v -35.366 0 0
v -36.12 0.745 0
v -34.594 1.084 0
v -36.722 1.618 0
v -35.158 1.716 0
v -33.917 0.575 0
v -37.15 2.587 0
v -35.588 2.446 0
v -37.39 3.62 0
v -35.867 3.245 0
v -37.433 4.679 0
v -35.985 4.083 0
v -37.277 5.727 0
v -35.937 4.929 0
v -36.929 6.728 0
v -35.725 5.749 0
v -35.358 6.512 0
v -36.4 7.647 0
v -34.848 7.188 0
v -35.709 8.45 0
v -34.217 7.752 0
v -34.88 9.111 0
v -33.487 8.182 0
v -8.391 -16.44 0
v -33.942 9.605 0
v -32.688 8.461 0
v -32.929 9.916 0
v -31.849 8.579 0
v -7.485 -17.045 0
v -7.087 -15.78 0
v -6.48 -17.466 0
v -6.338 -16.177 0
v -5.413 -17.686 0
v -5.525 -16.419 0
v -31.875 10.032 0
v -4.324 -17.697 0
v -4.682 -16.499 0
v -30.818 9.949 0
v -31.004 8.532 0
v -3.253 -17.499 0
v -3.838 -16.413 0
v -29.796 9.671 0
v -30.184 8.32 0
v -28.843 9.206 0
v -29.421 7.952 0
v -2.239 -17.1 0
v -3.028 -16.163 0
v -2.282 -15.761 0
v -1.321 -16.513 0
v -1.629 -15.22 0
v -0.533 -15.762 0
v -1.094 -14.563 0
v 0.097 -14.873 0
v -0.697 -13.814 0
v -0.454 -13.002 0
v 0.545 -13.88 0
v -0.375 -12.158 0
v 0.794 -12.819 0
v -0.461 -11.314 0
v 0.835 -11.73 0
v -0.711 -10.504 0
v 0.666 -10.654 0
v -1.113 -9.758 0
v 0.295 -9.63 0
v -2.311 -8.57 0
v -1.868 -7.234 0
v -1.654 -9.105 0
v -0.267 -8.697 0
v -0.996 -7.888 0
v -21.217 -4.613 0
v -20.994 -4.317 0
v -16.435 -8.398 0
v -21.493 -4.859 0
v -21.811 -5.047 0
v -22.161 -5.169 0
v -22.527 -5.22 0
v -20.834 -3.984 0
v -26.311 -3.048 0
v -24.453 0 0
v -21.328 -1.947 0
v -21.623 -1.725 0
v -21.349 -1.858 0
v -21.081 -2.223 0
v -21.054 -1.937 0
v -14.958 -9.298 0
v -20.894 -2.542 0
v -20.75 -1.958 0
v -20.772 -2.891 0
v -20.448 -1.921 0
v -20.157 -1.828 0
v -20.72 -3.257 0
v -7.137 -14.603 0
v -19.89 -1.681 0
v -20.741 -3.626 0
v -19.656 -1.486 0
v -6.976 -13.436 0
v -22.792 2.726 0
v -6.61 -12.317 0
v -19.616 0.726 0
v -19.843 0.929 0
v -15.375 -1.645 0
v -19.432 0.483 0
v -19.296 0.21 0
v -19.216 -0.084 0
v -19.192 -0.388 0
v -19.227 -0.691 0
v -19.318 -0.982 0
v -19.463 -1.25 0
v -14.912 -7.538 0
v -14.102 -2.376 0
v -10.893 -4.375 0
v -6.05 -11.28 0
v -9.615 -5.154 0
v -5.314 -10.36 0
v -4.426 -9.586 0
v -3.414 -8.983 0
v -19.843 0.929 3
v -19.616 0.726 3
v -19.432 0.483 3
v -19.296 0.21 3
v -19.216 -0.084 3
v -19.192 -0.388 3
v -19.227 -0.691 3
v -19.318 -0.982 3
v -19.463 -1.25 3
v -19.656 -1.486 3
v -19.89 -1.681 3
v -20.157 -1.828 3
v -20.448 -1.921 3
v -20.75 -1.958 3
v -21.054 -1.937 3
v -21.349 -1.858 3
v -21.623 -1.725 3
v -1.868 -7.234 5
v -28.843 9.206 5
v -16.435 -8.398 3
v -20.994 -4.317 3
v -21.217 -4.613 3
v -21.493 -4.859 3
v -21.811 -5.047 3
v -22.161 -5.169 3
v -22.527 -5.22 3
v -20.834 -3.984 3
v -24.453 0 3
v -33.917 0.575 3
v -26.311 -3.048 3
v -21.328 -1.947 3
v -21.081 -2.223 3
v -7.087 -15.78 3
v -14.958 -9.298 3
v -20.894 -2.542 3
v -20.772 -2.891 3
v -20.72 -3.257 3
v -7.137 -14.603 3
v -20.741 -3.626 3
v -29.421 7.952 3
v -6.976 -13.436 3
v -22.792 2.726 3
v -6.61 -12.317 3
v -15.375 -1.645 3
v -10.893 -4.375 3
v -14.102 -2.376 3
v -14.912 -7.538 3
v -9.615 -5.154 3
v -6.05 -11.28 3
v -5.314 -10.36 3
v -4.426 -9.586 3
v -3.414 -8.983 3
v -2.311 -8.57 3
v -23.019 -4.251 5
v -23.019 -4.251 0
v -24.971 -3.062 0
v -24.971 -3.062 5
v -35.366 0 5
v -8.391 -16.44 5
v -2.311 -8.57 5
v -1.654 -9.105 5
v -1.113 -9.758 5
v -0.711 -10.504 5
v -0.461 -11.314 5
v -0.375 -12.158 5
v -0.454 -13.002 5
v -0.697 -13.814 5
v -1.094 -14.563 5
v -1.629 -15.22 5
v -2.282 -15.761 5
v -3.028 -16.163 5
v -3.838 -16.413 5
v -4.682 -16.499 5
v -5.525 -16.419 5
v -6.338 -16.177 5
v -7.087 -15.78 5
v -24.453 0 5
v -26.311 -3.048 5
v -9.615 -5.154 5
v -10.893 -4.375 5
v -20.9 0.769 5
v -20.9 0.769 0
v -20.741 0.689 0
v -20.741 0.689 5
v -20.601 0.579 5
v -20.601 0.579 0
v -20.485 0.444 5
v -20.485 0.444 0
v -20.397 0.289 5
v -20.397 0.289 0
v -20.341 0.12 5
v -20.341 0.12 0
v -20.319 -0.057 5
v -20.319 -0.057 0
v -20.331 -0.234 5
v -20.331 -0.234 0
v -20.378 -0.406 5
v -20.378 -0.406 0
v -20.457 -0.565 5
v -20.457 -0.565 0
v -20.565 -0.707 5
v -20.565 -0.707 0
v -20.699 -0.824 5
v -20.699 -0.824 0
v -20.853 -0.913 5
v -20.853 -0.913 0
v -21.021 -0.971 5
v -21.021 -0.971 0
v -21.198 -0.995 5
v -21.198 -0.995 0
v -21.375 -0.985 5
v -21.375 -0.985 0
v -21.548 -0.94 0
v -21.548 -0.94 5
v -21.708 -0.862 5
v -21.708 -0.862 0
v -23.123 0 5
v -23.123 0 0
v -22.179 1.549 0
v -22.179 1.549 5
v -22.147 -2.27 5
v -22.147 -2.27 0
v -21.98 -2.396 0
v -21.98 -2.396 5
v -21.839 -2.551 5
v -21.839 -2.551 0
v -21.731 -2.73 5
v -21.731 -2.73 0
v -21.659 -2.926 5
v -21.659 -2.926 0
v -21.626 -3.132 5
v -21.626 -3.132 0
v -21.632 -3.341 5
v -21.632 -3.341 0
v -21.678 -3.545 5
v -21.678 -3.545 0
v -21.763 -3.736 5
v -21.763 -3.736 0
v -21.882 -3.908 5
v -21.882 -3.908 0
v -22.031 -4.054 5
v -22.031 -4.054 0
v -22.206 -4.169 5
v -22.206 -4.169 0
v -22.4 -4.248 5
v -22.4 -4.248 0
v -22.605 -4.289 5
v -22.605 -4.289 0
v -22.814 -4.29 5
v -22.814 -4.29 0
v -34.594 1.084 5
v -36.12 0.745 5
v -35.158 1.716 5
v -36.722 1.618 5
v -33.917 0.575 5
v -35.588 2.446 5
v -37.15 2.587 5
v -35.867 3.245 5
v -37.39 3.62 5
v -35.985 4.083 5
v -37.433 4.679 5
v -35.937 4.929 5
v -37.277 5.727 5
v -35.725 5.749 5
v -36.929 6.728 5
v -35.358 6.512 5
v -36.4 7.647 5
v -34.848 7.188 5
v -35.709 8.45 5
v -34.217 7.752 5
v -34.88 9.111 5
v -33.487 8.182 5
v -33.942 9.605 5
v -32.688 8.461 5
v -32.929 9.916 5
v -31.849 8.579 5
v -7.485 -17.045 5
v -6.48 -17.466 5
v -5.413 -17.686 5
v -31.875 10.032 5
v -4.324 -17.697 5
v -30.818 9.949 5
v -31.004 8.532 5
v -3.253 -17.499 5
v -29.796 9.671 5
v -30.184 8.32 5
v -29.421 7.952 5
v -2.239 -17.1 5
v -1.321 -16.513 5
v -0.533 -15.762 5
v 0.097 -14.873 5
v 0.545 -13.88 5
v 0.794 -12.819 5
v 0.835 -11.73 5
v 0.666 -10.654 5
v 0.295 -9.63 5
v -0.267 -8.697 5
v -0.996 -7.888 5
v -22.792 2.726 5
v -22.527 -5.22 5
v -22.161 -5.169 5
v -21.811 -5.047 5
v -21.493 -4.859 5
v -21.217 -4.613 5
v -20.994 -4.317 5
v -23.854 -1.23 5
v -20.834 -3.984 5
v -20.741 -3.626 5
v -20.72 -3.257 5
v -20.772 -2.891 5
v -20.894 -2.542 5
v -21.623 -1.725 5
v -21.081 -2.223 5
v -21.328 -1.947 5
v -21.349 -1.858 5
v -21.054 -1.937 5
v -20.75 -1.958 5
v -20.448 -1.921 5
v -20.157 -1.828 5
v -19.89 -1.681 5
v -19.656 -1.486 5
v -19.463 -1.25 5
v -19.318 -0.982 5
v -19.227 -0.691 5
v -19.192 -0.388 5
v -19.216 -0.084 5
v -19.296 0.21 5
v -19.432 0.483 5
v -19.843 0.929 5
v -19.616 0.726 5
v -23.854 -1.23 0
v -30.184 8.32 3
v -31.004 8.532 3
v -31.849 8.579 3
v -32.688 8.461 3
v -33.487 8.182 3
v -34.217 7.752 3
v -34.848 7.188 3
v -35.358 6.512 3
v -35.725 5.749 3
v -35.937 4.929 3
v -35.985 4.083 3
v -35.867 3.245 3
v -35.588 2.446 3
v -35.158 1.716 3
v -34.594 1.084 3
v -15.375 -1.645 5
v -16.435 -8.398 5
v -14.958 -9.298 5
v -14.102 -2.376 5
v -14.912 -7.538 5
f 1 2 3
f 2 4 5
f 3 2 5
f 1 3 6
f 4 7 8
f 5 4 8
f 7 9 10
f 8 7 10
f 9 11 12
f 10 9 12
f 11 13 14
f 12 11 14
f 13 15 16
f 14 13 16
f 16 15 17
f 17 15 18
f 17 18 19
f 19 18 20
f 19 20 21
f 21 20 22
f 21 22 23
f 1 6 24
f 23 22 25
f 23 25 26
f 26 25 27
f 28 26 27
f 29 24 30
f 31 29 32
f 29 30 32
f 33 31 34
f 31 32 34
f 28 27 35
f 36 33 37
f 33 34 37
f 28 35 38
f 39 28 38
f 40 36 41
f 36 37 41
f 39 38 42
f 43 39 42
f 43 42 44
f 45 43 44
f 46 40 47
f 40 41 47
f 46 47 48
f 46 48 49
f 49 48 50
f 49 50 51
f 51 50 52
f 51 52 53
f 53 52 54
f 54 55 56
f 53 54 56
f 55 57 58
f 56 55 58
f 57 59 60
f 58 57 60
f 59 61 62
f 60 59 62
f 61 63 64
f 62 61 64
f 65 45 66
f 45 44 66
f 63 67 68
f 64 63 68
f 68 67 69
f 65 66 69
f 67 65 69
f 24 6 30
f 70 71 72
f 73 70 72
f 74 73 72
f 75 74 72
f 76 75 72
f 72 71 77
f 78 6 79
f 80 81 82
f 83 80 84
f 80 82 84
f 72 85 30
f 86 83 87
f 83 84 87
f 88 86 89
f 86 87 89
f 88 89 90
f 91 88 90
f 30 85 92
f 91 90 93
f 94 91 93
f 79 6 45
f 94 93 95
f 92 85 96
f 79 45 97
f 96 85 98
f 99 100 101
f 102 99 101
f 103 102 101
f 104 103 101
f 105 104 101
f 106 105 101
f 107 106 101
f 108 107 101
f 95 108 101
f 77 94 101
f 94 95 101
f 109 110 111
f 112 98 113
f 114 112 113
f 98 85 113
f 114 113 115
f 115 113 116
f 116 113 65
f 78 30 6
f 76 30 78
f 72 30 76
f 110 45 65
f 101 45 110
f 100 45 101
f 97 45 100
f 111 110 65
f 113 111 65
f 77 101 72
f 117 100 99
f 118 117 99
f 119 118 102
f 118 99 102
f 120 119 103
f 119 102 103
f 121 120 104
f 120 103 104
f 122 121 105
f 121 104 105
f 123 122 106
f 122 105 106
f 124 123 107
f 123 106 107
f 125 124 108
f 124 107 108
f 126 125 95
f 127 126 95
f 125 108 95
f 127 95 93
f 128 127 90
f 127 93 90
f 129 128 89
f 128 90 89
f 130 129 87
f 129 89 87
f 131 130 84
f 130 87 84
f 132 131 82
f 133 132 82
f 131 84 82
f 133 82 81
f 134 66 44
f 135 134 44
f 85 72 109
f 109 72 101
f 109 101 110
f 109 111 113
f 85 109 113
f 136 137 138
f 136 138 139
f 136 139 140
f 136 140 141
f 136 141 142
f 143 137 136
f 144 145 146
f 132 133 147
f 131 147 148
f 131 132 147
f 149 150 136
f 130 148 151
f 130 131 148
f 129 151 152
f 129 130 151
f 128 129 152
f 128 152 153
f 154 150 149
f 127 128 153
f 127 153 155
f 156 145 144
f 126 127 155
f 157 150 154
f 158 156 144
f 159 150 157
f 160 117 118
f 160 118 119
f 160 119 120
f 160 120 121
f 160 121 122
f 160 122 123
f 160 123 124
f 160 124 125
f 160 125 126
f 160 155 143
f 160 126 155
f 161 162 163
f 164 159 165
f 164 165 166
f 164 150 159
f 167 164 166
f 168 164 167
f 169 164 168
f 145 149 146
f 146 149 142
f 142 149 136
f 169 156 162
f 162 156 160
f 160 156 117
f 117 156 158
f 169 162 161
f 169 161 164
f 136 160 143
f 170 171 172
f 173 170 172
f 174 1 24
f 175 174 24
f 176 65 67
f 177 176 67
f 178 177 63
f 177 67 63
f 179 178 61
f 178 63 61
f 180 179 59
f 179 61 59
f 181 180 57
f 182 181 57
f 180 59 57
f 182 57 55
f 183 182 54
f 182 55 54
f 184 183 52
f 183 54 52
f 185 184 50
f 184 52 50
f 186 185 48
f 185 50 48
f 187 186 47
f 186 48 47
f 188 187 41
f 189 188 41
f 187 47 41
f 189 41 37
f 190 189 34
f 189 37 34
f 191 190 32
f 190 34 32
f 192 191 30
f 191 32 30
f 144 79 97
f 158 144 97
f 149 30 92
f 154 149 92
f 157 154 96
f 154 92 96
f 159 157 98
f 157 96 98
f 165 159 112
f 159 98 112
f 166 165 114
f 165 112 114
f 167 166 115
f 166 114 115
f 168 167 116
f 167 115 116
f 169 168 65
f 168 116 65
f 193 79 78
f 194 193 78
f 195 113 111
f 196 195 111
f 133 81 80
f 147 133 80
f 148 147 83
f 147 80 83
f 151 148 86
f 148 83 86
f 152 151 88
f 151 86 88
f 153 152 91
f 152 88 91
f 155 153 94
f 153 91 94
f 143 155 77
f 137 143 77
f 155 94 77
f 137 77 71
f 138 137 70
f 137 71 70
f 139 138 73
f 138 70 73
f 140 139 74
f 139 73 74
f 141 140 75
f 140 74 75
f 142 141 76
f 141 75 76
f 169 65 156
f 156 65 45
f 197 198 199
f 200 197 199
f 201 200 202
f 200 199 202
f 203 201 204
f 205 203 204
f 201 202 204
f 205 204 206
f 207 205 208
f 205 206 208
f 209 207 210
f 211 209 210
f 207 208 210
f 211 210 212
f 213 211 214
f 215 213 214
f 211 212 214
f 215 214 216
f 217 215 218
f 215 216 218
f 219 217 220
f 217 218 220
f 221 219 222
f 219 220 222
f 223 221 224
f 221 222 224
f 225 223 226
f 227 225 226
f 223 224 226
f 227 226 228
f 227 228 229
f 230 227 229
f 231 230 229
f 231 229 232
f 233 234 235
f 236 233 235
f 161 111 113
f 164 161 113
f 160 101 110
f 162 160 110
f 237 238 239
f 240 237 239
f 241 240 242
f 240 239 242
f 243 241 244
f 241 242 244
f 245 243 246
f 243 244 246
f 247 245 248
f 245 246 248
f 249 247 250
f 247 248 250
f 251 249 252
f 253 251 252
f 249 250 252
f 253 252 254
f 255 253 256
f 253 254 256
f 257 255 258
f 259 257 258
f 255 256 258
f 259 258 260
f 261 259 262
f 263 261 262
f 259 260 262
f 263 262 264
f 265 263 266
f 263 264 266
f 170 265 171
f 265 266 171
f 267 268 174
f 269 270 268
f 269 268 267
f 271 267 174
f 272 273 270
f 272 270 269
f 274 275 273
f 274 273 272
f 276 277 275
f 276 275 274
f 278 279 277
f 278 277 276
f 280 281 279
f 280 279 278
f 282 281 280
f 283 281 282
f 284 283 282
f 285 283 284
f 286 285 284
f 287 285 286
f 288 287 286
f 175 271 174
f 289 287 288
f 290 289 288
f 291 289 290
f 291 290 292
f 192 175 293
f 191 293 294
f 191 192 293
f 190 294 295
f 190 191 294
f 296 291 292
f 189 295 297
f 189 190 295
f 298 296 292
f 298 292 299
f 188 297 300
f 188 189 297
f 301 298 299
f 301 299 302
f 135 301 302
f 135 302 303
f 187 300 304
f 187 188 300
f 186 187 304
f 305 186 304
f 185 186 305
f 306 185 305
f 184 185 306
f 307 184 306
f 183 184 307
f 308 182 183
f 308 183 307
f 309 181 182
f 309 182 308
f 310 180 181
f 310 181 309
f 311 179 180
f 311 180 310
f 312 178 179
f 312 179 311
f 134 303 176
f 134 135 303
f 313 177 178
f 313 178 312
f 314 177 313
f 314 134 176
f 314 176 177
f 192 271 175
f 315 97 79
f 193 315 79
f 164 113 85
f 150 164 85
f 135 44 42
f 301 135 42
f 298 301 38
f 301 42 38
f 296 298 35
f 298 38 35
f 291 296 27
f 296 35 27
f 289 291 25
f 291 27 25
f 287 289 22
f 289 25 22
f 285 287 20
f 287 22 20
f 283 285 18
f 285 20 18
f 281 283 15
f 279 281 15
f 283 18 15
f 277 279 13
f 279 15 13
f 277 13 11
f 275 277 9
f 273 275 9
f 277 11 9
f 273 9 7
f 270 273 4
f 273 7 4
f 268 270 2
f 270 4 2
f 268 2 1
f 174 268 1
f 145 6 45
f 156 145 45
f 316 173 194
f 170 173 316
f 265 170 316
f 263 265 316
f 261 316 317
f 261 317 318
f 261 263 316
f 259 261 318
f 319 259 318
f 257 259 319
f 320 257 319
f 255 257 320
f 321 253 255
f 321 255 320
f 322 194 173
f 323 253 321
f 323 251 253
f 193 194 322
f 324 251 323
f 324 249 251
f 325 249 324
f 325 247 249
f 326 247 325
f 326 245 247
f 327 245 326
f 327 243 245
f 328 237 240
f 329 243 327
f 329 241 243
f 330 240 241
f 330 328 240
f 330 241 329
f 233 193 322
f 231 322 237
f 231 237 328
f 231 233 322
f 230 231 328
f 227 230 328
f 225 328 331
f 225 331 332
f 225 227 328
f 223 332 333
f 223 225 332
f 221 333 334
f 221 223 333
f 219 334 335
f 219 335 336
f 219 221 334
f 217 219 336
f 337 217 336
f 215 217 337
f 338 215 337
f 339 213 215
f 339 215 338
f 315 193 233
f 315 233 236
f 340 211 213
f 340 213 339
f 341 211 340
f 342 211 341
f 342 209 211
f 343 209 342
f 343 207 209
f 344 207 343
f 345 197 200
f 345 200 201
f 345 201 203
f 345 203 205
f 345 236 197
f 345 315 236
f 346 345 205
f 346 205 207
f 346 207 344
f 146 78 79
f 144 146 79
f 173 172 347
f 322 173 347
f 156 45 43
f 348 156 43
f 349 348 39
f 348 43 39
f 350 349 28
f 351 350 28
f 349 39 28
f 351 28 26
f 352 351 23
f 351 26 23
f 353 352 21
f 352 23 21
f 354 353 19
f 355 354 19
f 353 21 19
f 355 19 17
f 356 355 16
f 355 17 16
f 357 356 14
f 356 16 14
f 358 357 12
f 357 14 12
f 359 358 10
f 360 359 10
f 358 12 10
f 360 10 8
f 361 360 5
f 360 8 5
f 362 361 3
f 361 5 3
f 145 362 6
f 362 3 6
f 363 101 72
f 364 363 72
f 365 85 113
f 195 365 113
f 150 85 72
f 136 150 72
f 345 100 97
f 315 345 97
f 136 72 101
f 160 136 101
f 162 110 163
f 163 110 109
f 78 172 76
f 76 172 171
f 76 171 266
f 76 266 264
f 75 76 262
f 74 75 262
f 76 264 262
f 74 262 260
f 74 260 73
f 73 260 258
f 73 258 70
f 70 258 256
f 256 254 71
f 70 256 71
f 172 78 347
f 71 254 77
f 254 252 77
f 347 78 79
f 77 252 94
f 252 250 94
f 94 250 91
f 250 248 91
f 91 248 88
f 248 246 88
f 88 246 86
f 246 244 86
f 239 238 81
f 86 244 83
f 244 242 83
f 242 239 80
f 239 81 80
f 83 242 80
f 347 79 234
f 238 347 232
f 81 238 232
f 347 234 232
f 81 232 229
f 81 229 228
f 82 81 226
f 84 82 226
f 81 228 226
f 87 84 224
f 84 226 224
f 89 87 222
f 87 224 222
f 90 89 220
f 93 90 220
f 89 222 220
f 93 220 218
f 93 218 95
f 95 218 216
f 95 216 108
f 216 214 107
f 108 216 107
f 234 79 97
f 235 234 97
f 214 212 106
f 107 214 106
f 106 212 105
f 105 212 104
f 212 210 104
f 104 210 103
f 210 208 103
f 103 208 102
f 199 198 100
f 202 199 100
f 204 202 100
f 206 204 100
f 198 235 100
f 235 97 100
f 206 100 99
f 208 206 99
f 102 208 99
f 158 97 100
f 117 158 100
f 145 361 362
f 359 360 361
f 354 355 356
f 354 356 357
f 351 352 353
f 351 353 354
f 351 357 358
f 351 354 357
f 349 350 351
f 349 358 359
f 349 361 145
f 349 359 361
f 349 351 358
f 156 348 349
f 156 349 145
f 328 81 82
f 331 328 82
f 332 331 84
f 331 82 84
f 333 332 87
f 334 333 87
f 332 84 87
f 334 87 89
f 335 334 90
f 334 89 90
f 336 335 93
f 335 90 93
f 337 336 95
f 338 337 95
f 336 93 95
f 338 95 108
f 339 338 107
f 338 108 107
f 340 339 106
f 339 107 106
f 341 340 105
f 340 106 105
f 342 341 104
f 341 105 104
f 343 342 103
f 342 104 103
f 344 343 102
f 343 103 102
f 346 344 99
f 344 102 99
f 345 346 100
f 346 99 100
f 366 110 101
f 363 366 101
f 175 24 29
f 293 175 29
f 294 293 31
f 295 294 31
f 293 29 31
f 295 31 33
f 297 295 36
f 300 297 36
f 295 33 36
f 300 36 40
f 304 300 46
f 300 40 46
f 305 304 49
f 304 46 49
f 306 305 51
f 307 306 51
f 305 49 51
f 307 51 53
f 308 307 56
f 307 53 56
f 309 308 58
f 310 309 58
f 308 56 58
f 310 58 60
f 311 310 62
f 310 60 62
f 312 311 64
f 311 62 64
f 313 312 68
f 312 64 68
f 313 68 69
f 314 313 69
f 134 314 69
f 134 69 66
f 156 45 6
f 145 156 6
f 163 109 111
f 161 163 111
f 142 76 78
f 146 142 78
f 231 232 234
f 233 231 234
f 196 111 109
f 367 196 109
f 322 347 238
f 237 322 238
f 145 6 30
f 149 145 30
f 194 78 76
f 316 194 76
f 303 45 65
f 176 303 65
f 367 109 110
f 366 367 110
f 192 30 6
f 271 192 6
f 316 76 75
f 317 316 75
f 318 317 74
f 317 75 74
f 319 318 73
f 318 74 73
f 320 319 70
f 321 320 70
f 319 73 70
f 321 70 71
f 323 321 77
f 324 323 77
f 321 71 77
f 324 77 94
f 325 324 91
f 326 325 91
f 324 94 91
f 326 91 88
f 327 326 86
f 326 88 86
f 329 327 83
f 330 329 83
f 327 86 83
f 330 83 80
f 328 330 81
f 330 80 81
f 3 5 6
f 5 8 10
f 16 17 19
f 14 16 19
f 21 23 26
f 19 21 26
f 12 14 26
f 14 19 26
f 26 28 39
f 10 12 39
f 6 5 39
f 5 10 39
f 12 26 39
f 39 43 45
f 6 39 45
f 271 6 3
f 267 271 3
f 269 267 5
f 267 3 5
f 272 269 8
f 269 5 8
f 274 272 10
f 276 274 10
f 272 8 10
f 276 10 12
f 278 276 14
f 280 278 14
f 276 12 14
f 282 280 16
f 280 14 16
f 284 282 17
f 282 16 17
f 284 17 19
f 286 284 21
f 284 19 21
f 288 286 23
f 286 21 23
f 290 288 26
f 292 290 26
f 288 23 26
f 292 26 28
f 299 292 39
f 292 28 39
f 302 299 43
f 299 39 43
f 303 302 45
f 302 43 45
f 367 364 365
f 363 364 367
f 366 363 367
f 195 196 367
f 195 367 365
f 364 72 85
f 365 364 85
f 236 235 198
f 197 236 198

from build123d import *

# Parameters (mm, degrees)
F1_DEPTH = 5
F2_DEPTH = 3
F3_DEPTH = 3


with BuildPart() as f1:
    # F0 (on Top) → F1 (new body)
    with BuildSketch(Plane.XY):
        with BuildLine():
            Line((-1.867539, -7.233898), (-28.842813, 9.206171))
            ThreePointArc((-28.842813, 9.206171), (-36.399896, 7.646745), (-35.366166, 0))
            Line((-35.366166, 0), (-8.390893, -16.440069))
            ThreePointArc((-8.390893, -16.440069), (-0.196412, -15.332294), (-1.867539, -7.233898))
        make_face()
        with BuildLine():
            ThreePointArc((-2.31108, -8.569936), (-1.093875, -14.562898), (-7.086837, -15.780102))
            Line((-7.086837, -15.780102), (-33.917468, 0.574954))
            ThreePointArc((-33.917468, 0.574954), (-35.357781, 6.511557), (-29.421301, 7.952377))
            Line((-29.421301, 7.952377), (-2.31108, -8.569936))
        make_face(mode=Mode.SUBTRACT)
        with BuildLine():
            Line((-19.843331, 0.92877), (-22.791918, 2.725786))
            Line((-22.791918, 2.725786), (-24.453147, 0))
            Line((-24.453147, 0), (-21.623004, -1.72483))
            ThreePointArc((-21.623004, -1.72483), (-19.462769, -1.25004), (-19.843331, 0.92877))
        make_face()
        with BuildLine():
            Line((-21.707896, -0.862415), (-23.122968, 0))
            Line((-23.122968, 0), (-22.179092, 1.548735))
            Line((-22.179092, 1.548735), (-20.899853, 0.769103))
            ThreePointArc((-20.899853, 0.769103), (-20.413438, -0.487664), (-21.707896, -0.862415))
        make_face(mode=Mode.SUBTRACT)
        with BuildLine():
            Line((-21.623004, -1.72483), (-24.453147, 0))
            Line((-24.453147, 0), (-26.310924, -3.048285))
            Line((-26.310924, -3.048285), (-22.526877, -5.21989))
            ThreePointArc((-22.526877, -5.21989), (-20.778538, -3.807628), (-21.623004, -1.72483))
        make_face()
        with BuildLine():
            Line((-24.970907, -3.061822), (-23.85436, -1.229764))
            Line((-23.85436, -1.229764), (-22.146926, -2.270359))
            ThreePointArc((-22.146926, -2.270359), (-21.715837, -3.642604), (-23.019008, -4.251406))
            Line((-23.019008, -4.251406), (-24.970907, -3.061822))
        make_face(mode=Mode.SUBTRACT)
        Polygon((-14.101946, -2.375546), (-15.375238, -1.644824), (-16.434679, -8.398493), (-14.958266, -9.298292), (-9.614524, -5.154082), (-10.89326, -4.374757), (-14.911733, -7.537731), align=None)
    extrude(amount=F1_DEPTH)


with BuildPart() as f2:
    # F0 (on Top) → F2 (new body)
    with BuildSketch(Plane.XY):
        with BuildLine():
            Line((-33.917468, 0.574954), (-7.086837, -15.780102))
            ThreePointArc((-7.086837, -15.780102), (-6.050051, -11.280104), (-2.31108, -8.569936))
            Line((-2.31108, -8.569936), (-29.421301, 7.952377))
            Line((-29.421301, 7.952377), (-33.917468, 0.574954))
        make_face()
        Polygon((-16.434679, -8.398493), (-15.375238, -1.644824), (-14.101946, -2.375546), (-14.911733, -7.537731), (-10.89326, -4.374757), (-9.614524, -5.154082), (-14.958266, -9.298292), align=None, mode=Mode.SUBTRACT)
        with BuildLine():
            Line((-24.453147, 0), (-22.791918, 2.725786))
            Line((-22.791918, 2.725786), (-19.843331, 0.92877))
            ThreePointArc((-19.843331, 0.92877), (-19.462769, -1.25004), (-21.623004, -1.72483))
            ThreePointArc((-21.623004, -1.72483), (-20.778538, -3.807628), (-22.526877, -5.21989))
            Line((-22.526877, -5.21989), (-26.310924, -3.048285))
            Line((-26.310924, -3.048285), (-24.453147, 0))
        make_face(mode=Mode.SUBTRACT)
    extrude(amount=F2_DEPTH)


with BuildPart() as f3:
    # F0 (on Top) → F3 (new body)
    with BuildSketch(Plane.XY):
        with BuildLine():
            ThreePointArc((-29.421301, 7.952377), (-35.357781, 6.511557), (-33.917468, 0.574954))
            Line((-33.917468, 0.574954), (-29.421301, 7.952377))
        make_face()
    extrude(amount=F3_DEPTH)


solid = Compound([f1.part, f2.part, f3.part])
